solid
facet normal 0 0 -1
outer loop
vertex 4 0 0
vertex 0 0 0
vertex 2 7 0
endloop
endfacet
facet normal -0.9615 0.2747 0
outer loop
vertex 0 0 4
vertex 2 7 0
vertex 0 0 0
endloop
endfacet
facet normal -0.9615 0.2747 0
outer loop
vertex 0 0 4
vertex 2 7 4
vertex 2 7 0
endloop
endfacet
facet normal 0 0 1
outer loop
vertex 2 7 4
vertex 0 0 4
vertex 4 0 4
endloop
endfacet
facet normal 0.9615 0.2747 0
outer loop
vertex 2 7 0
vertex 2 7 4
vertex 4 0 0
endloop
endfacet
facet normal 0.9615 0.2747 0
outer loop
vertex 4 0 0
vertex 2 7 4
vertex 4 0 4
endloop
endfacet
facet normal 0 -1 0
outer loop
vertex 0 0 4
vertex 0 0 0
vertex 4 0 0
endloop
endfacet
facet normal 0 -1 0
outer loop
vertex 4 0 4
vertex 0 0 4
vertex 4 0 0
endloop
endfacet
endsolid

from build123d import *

# Parameters (mm, degrees)
F0_W      = 4
F0_H      = 7
F1_DEPTH  = 4
F6_DEPTH  = 25
F10_DEPTH = 25


with BuildPart() as f1:
    # F0 (on Top) → F1 (new body)
    with BuildSketch(Plane.XY):
        with Locations((2, 3.5)):
            Rectangle(F0_W, F0_H)
    extrude(amount=F1_DEPTH)

    # F5 (on 3pt) → F6 (cut)
    with BuildSketch(Plane(origin=(3.6981132075, 1.0566037736, 0), x_dir=(0.2747211279, -0.9615239476, 0), z_dir=(-0.9615239476, -0.2747211279, 0))):
        Polygon((9.2587498633, -3.3276440962), (7.0551056415, 9.7208032385), (-14.3242254853, 4.7958698124), (-11.358814391, -8.0770972366), align=None)
    extrude(amount=-F6_DEPTH, mode=Mode.SUBTRACT)

    # F9 (on 3pt) → F10 (cut)
    with BuildSketch(Plane(origin=(0, 0, 0), x_dir=(-0.2747211279, -0.9615239476, 0), z_dir=(-0.9615239476, 0.2747211279, 0))):
        Polygon((-10.4345437139, -9.9992519245), (-6.7709279247, -9.4136027619), (6.2972279266, -9.4136027619), (3.8799964823, 17.0888453722), (-6.9220042787, 14.663727954), (-10.4345437139, 17.9398357868), align=None)
    extrude(amount=F10_DEPTH, mode=Mode.SUBTRACT)


solid = f1.part
